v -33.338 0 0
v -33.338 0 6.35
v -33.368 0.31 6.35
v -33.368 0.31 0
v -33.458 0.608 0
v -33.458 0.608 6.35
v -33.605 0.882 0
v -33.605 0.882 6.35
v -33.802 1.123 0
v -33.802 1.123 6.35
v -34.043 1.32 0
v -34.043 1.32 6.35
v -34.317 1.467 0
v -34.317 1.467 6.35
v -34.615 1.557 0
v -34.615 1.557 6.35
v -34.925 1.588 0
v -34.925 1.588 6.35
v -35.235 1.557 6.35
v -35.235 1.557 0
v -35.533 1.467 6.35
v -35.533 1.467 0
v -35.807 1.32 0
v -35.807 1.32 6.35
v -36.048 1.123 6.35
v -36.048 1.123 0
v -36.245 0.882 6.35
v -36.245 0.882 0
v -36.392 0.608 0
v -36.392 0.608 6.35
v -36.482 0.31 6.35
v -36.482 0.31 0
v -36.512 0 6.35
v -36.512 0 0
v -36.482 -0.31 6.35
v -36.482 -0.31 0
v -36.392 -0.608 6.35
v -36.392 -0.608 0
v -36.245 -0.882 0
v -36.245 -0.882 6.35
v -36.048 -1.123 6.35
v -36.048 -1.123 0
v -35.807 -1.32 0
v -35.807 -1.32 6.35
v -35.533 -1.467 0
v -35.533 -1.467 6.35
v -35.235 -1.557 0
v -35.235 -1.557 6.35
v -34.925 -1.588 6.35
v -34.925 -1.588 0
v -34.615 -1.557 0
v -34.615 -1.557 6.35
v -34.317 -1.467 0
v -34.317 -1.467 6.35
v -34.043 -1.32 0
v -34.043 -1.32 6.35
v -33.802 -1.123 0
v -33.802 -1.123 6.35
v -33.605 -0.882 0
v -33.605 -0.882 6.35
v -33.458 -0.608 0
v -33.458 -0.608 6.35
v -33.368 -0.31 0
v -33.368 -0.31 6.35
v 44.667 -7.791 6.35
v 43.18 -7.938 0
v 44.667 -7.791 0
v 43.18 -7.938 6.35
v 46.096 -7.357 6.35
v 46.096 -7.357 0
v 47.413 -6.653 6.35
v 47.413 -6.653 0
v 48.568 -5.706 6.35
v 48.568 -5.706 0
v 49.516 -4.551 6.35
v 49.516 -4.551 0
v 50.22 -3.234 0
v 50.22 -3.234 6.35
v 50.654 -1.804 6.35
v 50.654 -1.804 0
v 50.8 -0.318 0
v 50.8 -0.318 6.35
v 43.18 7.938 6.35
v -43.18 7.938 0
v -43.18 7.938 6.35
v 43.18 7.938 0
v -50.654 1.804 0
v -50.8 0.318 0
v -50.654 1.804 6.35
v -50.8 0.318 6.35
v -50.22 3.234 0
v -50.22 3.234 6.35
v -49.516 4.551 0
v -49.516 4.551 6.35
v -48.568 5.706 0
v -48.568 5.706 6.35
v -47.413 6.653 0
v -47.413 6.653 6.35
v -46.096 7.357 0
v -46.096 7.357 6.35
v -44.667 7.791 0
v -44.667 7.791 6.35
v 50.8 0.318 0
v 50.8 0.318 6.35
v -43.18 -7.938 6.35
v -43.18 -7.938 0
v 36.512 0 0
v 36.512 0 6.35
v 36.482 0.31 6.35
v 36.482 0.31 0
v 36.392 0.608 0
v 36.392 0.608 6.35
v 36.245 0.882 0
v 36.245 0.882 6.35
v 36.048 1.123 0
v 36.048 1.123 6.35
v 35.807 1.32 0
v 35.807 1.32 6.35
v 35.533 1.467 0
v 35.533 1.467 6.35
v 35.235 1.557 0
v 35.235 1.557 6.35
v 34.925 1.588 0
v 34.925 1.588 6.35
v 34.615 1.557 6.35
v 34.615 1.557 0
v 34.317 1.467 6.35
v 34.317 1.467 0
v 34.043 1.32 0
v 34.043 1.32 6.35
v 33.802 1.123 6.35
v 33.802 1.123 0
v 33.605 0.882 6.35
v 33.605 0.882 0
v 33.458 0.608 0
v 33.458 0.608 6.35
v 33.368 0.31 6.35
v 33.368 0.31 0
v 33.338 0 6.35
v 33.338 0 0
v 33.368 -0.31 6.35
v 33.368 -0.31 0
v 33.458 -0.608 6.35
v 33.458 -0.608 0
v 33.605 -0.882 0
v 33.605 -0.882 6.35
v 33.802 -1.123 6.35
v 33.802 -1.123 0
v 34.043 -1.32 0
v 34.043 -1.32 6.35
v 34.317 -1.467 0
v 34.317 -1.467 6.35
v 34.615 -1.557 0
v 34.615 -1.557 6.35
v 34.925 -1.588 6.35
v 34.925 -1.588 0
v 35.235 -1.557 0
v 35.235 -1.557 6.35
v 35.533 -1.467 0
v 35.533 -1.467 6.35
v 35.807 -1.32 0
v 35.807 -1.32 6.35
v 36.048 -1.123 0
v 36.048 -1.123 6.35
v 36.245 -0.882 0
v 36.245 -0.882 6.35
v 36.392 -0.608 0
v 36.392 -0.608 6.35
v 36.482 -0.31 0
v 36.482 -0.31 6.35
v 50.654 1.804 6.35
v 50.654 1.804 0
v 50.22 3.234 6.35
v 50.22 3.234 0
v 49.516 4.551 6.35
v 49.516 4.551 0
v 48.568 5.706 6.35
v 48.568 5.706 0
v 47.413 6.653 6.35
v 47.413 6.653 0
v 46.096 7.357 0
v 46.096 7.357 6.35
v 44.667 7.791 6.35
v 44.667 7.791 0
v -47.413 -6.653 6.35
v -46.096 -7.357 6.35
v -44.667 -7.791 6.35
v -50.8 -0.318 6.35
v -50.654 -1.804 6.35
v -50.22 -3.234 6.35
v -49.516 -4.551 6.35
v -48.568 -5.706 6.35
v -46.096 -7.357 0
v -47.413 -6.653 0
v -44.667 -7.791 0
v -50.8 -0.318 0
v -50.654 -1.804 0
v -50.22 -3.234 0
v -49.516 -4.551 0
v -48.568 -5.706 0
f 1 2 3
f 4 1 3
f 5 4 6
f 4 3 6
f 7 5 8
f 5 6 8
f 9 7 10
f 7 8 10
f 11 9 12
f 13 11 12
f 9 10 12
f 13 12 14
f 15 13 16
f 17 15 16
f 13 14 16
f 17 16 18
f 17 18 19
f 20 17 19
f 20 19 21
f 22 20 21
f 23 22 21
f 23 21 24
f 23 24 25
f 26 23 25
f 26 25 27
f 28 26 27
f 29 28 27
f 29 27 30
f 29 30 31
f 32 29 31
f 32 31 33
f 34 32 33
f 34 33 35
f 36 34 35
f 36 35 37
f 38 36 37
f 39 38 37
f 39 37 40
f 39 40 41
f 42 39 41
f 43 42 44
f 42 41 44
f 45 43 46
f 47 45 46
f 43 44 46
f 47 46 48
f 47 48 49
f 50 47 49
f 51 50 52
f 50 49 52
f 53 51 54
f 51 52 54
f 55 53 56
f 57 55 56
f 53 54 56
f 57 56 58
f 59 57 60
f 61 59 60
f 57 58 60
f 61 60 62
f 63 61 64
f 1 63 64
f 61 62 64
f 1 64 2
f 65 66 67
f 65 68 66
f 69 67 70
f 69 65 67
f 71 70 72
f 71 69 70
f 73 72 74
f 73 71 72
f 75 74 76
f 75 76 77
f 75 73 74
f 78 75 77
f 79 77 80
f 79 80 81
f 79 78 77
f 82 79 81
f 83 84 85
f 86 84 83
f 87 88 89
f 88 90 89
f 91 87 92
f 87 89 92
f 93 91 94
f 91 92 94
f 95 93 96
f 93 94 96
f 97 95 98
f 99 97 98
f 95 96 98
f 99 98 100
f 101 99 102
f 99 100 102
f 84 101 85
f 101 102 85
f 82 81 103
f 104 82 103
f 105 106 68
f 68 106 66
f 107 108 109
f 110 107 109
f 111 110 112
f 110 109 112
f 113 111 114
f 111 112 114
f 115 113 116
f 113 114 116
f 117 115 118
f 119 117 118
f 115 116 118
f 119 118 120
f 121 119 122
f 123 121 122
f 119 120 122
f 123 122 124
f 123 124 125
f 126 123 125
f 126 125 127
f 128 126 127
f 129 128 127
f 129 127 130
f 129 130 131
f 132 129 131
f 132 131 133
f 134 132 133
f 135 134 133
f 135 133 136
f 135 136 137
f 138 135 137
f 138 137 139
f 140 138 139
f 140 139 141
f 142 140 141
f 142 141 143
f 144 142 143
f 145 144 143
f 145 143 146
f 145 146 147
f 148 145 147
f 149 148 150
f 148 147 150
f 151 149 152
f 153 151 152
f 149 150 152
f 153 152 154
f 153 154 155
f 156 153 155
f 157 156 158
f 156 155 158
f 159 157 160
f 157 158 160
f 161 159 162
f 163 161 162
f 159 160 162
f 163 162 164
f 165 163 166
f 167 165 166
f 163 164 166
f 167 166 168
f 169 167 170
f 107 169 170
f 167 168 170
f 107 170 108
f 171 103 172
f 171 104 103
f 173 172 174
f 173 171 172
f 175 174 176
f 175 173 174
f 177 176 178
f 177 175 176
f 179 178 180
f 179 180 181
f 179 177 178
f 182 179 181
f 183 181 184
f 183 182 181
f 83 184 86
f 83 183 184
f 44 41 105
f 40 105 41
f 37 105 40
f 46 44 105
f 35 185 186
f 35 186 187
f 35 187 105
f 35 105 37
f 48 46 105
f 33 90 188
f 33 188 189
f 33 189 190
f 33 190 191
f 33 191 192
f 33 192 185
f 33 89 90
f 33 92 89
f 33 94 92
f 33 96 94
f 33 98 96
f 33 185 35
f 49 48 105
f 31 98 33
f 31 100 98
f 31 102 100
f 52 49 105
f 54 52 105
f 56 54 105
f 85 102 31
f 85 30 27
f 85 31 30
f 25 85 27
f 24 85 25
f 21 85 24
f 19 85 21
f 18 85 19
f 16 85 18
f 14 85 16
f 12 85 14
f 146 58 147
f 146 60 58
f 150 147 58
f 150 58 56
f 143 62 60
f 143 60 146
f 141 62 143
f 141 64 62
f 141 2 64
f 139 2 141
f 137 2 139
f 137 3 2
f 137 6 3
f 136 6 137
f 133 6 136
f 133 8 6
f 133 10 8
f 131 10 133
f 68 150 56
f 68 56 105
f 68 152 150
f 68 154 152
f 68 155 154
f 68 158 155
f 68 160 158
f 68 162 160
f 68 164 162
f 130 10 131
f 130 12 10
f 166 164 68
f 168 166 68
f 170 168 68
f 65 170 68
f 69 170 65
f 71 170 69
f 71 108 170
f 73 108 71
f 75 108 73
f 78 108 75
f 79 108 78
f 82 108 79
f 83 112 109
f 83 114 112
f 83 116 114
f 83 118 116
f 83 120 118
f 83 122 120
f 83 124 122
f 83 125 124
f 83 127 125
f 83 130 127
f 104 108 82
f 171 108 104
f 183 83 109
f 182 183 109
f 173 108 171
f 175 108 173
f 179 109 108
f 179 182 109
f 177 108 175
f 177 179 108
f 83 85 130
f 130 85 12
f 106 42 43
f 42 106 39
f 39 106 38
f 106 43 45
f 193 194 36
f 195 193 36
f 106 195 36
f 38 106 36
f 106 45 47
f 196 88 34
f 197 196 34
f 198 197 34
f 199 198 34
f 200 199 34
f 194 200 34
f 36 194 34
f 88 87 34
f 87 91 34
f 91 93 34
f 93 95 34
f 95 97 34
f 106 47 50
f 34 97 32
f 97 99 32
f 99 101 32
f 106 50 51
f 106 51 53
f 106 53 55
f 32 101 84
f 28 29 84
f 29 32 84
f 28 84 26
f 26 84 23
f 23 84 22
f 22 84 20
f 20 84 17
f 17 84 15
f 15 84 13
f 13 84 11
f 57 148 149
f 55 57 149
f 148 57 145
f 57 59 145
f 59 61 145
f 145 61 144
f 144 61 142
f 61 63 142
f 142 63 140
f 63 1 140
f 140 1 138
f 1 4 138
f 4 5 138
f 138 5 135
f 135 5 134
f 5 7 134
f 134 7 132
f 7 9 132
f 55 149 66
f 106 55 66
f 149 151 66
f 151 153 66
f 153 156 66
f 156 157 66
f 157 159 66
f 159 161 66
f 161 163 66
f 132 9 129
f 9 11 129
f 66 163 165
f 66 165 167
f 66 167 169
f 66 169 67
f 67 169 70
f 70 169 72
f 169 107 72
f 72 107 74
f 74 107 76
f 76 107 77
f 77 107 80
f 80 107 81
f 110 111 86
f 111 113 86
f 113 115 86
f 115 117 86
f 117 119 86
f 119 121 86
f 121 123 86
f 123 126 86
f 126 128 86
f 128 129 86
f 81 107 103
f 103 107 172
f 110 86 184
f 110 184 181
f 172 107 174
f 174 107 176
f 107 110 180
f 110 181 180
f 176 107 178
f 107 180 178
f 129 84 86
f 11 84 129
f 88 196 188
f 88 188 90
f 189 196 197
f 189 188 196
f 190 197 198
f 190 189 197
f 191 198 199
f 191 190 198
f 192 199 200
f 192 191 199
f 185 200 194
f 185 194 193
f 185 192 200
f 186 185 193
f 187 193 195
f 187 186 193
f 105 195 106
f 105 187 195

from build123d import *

# Parameters (mm, degrees)
F0_W     = 101.6
F0_H     = 15.875
F1_DEPTH = 6.35
F2_R     = 7.62
F3_R     = 1.5875
F4_DEPTH = 25.4


with BuildPart() as f1:
    # F0 (on Top) → F1 (new body)
    with BuildSketch(Plane.XY):
        Rectangle(F0_W, F0_H)
    extrude(amount=F1_DEPTH)

    # F2
    f2_edges = [f1.edges().sort_by_distance(p)[0] for p in [
        (-50.8, 7.9375, 3.175),
        (-50.8, -7.9375, 3.175),
        (50.8, 7.9375, 3.175),
        (50.8, -7.9375, 3.175),
    ]]
    fillet(f2_edges, radius=F2_R)

    # F3 (on face) → F4 (cut)
    with BuildSketch(Plane.XY.offset(6.35)):
        with Locations((-34.925, 0)):
            Circle(F3_R)
        with Locations((34.925, 0)):
            Circle(F3_R)
    extrude(amount=-F4_DEPTH, mode=Mode.SUBTRACT)


solid = f1.part
